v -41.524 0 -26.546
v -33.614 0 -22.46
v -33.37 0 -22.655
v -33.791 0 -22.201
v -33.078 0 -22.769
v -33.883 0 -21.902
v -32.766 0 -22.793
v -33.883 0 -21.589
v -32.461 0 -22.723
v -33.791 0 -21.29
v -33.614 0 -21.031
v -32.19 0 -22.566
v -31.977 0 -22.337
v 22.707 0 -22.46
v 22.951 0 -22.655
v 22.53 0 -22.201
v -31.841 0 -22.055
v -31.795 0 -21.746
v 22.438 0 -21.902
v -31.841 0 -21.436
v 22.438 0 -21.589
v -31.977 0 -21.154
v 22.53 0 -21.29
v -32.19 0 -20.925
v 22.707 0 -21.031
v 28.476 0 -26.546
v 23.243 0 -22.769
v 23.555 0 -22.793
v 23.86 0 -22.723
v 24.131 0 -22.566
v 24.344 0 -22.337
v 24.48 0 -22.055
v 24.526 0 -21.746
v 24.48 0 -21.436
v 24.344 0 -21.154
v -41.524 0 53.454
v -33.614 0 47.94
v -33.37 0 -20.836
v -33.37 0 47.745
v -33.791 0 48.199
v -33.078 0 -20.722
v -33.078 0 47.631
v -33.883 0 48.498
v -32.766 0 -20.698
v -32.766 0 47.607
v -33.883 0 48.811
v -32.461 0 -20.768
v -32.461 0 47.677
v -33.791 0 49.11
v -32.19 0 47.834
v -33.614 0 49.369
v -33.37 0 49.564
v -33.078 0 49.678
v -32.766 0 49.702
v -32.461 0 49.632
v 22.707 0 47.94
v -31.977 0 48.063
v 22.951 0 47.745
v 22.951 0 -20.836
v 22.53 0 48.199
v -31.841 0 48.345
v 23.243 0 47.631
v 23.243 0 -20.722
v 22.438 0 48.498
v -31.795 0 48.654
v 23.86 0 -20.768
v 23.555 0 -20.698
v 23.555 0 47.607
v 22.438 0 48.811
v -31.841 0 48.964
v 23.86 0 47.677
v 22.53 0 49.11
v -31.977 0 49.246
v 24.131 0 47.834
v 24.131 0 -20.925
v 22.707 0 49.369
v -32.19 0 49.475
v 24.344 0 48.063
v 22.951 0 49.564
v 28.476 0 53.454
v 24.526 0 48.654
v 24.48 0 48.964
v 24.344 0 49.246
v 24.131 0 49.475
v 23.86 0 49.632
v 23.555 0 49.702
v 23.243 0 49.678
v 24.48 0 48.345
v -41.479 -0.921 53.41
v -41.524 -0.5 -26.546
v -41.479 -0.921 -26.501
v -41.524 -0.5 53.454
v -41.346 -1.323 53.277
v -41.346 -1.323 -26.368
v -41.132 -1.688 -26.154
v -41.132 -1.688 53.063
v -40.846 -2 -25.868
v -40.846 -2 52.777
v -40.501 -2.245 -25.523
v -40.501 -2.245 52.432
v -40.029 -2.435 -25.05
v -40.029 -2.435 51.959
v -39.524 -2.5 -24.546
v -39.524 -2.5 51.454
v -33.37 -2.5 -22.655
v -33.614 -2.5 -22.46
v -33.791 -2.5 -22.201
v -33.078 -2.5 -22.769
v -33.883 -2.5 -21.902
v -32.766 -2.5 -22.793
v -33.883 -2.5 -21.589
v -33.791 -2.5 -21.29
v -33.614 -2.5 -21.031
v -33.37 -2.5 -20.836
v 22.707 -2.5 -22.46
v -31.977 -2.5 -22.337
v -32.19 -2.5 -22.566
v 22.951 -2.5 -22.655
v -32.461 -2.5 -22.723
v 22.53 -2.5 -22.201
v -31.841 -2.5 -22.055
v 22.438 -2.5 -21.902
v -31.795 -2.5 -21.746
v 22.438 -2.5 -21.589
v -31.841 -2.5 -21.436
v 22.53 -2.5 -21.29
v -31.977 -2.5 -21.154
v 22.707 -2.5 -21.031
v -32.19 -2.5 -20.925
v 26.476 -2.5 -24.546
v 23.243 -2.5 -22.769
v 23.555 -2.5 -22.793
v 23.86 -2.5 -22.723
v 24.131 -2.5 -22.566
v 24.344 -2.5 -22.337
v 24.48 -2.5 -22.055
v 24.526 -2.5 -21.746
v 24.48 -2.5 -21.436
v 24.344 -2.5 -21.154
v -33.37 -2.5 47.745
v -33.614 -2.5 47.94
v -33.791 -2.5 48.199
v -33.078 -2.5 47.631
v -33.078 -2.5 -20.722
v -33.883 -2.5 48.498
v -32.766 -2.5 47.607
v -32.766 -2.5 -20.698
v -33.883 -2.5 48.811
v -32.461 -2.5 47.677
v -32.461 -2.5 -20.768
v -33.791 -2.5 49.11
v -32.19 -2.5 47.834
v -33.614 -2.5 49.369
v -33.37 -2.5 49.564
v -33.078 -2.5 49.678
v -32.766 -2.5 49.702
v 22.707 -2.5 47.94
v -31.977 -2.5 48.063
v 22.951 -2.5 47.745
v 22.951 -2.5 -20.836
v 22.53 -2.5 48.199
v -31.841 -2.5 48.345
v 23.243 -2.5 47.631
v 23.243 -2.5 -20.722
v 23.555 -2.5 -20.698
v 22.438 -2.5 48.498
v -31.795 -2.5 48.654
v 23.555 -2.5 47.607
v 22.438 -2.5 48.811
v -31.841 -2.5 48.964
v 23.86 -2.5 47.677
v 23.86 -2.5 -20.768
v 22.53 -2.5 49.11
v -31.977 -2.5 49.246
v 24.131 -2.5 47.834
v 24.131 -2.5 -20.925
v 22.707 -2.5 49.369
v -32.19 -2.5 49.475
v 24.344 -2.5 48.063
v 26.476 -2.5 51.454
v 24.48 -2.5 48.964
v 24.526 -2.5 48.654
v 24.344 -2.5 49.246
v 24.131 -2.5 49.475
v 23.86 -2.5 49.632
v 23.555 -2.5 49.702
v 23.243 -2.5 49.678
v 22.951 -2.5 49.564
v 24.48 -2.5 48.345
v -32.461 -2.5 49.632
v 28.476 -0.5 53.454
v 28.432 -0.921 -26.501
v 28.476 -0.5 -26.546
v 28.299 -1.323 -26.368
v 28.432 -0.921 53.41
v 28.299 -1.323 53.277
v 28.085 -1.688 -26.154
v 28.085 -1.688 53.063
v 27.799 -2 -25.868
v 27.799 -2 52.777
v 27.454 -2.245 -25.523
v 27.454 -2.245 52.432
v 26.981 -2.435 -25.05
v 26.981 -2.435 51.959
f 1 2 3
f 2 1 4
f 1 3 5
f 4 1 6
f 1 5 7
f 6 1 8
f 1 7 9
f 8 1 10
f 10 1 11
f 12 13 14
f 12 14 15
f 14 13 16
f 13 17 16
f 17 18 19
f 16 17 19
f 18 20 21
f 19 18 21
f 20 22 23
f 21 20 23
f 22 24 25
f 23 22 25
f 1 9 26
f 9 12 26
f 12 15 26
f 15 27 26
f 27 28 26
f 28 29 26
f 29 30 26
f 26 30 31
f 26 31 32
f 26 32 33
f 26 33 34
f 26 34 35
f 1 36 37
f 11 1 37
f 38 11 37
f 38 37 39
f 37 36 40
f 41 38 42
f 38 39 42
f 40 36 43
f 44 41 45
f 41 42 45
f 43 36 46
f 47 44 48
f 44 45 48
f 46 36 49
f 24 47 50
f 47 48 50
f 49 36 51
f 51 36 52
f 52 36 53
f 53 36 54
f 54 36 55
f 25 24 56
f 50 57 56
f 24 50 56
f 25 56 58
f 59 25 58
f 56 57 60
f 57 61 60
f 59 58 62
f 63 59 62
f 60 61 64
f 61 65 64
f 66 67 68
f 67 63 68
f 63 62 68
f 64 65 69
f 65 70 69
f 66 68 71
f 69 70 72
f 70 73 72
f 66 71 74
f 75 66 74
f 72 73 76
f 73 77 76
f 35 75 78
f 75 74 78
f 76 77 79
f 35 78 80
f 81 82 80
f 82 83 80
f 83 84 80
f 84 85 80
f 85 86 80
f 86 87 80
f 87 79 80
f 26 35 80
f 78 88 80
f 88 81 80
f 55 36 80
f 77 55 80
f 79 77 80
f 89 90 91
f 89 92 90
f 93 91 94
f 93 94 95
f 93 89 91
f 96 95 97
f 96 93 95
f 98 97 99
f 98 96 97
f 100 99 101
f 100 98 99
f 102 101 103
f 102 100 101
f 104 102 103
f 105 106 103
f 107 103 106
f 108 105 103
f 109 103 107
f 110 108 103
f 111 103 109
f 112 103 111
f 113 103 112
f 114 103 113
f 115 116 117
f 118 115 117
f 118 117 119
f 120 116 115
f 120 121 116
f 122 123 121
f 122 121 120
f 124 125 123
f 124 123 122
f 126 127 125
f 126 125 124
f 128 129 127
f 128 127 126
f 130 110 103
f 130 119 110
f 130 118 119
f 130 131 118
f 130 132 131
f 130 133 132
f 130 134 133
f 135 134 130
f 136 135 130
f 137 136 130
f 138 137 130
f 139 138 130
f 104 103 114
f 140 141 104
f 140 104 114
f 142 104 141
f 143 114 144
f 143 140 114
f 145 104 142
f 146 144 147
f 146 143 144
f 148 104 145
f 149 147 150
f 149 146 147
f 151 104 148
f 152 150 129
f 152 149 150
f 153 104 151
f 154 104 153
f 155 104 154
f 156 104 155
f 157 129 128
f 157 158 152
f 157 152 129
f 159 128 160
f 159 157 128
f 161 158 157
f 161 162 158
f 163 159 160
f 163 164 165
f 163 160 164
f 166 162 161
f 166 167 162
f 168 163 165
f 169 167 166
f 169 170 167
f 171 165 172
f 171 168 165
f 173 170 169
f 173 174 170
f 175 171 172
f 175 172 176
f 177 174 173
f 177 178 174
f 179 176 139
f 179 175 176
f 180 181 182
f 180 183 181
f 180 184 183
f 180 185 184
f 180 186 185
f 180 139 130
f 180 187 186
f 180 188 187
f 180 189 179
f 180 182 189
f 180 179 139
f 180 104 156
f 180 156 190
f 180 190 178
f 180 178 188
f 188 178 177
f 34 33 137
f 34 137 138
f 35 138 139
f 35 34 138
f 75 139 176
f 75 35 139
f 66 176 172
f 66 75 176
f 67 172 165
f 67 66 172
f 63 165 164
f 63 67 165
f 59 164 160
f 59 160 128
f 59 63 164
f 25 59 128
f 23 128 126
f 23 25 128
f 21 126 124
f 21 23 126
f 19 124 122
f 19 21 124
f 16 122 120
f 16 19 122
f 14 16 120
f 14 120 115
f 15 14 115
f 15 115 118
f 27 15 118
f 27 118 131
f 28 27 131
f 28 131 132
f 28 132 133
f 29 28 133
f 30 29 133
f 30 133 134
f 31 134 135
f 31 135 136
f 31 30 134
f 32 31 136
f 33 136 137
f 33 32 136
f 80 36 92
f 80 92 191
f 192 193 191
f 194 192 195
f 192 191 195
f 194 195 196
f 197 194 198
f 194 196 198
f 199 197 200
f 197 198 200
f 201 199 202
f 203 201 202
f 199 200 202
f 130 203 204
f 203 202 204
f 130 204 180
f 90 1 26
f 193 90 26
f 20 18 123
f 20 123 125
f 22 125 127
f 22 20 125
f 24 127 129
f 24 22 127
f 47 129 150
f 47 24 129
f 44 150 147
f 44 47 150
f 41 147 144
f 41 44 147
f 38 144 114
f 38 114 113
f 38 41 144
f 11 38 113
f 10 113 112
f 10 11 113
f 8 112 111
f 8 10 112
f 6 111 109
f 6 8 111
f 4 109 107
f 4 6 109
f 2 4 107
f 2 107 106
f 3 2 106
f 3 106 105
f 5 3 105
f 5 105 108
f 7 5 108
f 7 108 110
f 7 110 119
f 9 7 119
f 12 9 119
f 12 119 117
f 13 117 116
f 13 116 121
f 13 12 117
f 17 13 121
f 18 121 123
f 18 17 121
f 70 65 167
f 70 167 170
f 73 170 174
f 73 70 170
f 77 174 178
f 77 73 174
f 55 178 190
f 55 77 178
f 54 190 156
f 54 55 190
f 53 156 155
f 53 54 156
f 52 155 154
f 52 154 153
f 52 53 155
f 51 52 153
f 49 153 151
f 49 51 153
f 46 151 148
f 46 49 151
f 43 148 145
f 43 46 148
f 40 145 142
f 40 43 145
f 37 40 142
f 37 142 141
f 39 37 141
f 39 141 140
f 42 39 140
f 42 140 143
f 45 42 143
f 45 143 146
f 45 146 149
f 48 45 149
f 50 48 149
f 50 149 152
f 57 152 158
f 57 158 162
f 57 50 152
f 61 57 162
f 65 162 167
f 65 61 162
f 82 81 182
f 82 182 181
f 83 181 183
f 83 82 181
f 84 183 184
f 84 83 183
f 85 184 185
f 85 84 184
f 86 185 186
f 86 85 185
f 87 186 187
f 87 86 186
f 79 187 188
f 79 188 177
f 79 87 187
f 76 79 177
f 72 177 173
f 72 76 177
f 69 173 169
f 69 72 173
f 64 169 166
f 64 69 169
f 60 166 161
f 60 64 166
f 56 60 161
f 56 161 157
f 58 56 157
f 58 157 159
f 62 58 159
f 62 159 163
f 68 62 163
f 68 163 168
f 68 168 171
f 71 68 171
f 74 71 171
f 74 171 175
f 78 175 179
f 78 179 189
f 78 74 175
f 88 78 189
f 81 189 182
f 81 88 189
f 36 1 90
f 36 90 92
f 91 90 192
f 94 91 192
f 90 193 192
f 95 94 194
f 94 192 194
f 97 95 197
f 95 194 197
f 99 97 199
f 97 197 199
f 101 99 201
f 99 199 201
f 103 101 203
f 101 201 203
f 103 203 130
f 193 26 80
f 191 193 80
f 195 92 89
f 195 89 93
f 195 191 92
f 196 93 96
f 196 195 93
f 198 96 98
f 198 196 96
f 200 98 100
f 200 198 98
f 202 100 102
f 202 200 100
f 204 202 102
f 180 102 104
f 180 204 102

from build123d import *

# Parameters (mm, degrees)
F0_W     = 70
F0_H     = 80
F0_R     = 1.05
F1_DEPTH = 2.5
F2_R     = 2


with BuildPart() as f1:
    # F0 (on Front) → F1 (new body)
    with BuildSketch(Plane.XZ):
        with Locations((-6.523669, 13.454498)):
            Rectangle(F0_W, F0_H)
        with Locations((-32.844519, -21.745502)):
            Circle(F0_R, mode=Mode.SUBTRACT)
        with Locations((23.476331, -21.745502)):
            Circle(F0_R, mode=Mode.SUBTRACT)
        with Locations((-32.844519, 48.654498)):
            Circle(F0_R, mode=Mode.SUBTRACT)
        with Locations((23.476331, 48.654498)):
            Circle(F0_R, mode=Mode.SUBTRACT)
    extrude(amount=F1_DEPTH)

    # F2
    f2_edges = [f1.edges().sort_by_distance(p)[0] for p in [
        (-6.523669, -2.5, 53.454498),
        (-41.523669, -2.5, 13.454498),
        (-6.523669, -2.5, -26.545502),
        (28.476331, -2.5, 13.454498),
    ]]
    fillet(f2_edges, radius=F2_R)


solid = f1.part
